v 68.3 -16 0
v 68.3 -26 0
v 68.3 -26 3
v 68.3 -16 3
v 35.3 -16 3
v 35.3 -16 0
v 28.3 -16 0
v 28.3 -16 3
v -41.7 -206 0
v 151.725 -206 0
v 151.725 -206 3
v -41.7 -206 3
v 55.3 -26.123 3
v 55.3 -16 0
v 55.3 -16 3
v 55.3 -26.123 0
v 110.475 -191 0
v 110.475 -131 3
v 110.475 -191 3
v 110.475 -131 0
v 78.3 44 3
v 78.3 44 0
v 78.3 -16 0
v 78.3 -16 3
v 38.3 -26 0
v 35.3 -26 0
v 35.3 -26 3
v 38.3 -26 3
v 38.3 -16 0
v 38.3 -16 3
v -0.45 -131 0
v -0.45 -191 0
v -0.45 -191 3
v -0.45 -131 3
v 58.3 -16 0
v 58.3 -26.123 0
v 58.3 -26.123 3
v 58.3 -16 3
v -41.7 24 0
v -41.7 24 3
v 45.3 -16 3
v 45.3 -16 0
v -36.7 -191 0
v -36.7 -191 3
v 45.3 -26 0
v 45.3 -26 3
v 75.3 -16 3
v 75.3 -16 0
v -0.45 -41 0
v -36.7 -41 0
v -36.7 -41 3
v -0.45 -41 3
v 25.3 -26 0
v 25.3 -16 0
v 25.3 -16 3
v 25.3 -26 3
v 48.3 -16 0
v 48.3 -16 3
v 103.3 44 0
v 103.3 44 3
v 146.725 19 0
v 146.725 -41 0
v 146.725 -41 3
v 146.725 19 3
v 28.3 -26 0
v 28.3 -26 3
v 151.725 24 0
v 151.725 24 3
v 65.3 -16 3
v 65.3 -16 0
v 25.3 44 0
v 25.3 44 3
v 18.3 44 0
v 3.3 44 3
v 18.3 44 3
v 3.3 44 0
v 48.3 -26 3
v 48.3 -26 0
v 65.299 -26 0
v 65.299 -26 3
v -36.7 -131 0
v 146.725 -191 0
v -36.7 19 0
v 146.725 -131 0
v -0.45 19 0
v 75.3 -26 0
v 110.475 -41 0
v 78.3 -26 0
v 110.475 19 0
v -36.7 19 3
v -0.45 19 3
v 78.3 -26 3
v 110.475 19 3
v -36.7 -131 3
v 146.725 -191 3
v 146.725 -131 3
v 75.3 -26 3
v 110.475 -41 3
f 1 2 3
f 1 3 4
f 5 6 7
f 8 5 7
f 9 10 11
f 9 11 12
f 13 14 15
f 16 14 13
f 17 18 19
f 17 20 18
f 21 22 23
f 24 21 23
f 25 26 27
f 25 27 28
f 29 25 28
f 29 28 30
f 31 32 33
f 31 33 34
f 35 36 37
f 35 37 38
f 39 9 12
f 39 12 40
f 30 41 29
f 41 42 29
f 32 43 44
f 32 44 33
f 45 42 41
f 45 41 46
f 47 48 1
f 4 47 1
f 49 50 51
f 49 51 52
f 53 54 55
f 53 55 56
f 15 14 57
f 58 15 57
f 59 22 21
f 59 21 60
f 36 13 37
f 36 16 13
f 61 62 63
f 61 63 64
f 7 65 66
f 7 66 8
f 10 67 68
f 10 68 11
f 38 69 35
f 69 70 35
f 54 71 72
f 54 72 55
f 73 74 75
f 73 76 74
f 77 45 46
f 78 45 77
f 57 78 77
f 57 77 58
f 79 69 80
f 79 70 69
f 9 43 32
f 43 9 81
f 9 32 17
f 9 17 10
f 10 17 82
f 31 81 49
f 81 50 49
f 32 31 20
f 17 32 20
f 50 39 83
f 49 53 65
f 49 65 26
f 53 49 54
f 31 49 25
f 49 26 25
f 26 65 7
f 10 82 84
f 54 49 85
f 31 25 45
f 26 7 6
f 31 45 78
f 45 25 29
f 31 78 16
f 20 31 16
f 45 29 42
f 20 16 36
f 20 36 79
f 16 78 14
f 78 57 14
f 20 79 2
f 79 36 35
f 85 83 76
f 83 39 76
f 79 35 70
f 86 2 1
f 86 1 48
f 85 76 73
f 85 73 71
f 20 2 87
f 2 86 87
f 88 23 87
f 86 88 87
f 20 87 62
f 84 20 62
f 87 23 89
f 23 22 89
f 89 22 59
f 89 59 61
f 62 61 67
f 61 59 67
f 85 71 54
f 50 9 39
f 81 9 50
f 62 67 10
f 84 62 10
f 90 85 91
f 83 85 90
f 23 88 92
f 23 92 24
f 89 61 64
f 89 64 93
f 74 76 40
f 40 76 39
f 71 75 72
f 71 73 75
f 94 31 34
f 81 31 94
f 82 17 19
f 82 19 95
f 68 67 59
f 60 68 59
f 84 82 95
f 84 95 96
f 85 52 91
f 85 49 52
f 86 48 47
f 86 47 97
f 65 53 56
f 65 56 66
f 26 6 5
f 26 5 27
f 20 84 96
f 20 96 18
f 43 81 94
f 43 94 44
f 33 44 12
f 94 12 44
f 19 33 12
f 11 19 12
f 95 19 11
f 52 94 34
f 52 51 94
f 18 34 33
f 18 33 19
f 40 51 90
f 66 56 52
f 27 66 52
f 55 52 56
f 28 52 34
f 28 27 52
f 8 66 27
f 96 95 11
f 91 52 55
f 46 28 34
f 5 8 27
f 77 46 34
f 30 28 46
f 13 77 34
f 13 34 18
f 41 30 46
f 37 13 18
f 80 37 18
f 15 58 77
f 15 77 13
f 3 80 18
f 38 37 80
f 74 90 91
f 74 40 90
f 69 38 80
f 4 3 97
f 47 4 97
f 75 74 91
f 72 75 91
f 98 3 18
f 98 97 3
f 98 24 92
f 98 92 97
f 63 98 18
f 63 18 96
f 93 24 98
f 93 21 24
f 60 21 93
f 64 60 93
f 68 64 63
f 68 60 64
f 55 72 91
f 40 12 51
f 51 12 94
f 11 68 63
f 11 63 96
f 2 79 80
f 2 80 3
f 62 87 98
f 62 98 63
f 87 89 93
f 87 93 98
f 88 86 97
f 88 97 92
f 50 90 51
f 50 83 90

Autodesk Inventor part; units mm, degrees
ref_plane "YZ Plane" through (0, 0, 0) normal (1, 0, 0) x (0, 1, 0)
ref_plane "XZ Plane" through (0, 0, 0) normal (0, 1, 0) x (-1, 0, 0)
ref_plane "XY Plane" through (0, 0, 0) normal (0, 0, 1) x (1, 0, 0)
sketch "Sketch1" plane through (0, 0, 0) normal (0, 0, 1) x (1, 0, 0)
  line L0 (151.725, 24) -> (151.725, -206)
  line L1 (151.725, -206) -> (-41.7, -206)
  line L2 (-41.7, -206) -> (-41.7, 24)
  line L3 (151.725, 24) -> (103.3, 44)
  line L4 (3.3, 44) -> (-41.7, 24)
  line L5 (78.3, 44) -> (78.3, -16)
  line L6 (3.3, 44) -> (18.3, 44)
  line L7 (78.3, 44) -> (103.3, 44)
  line L8 (-34.2, -33.5) -> (-34.2, 11.5) projected
  line L9 (-2.95, 11.5) -> (-2.95, -33.5) projected
  line L10 (-36.7, -41) -> (-0.45, -41)
  line L11 (-0.45, -41) -> (-0.45, 19)
  line L12 (-0.45, 19) -> (-36.7, 19)
  line L13 (-36.7, 19) -> (-36.7, -41)
  line L14 (110.475, -41) -> (146.725, -41)
  line L15 (146.725, -41) -> (146.725, 19)
  line L16 (146.725, 19) -> (110.475, 19)
  line L17 (110.475, 19) -> (110.475, -41)
  line L18 (110.475, -191) -> (146.725, -191)
  line L19 (146.725, -191) -> (146.725, -131)
  line L20 (146.725, -131) -> (110.475, -131)
  line L21 (110.475, -131) -> (110.475, -191)
  line L22 (-36.7, -191) -> (-0.45, -191)
  line L23 (-0.45, -191) -> (-0.45, -131)
  line L24 (-0.45, -131) -> (-36.7, -131)
  line L25 (-36.7, -131) -> (-36.7, -191)
  line L26 (144.225, -33.5) -> (144.225, 11.5) projected
  line L27 (112.975, 11.5) -> (112.975, -33.5) projected
  line L28 (112.975, -183.5) -> (112.975, -138.5) projected
  line L29 (144.225, -138.5) -> (144.225, -183.5) projected
  line L30 (-34.2, -138.5) -> (-34.2, -183.5) projected
  line L31 (-2.95, -183.5) -> (-2.95, -138.5) projected
  line L32 (75.3, -16) -> (75.2995, -26)
  line L33 (75.2995, -26) -> (78.2995, -26)
  line L34 (78.2995, -26) -> (78.3, -16)
  line L35 (65.3, -16) -> (65.2995, -26)
  line L36 (65.2995, -26) -> (68.2995, -26)
  line L37 (68.2995, -26) -> (68.3, -16)
  line L38 (55.3, -16) -> (55.2995, -26.1226)
  line L39 (55.2995, -26.1226) -> (58.2995, -26.1227)
  line L40 (58.2995, -26.1227) -> (58.3, -16)
  line L41 (78.3, -16) -> (78.3, -16)
  line L42 (75.3, -16) -> (68.3, -16)
  line L43 (65.3, -16) -> (58.3, -16)
  line L44 (45.3, -16) -> (45.2995, -25.9999)
  line L45 (48.2995, -26) -> (48.3, -16)
  line L46 (45.2995, -25.9999) -> (48.2995, -26)
  line L47 (55.3, -16) -> (48.3, -16)
  line L48 (38.2995, -26) -> (38.3, -16)
  line L49 (35.2995, -26) -> (38.2995, -26)
  line L50 (35.3, -16) -> (35.2995, -26)
  line L51 (28.2995, -26) -> (28.3, -16)
  line L52 (25.2995, -26) -> (28.2995, -26)
  line L53 (25.3, -16) -> (25.2995, -26)
  line L54 (45.3, -16) -> (38.3, -16)
  line L55 (35.3, -16) -> (28.3, -16)
  line L56 (18.3, 44) -> (25.3, 44)
  line L57 (25.3, 44) -> (25.3, -16)
  point P0 (-34.2, -11)
  point P1 (-36.7, -11)
  point P2 (128.6, -41)
  point P3 (110.475, -11)
  point P4 (112.975, -11)
  point P5 (128.6, -191)
  point P6 (128.6, -131)
  point P7 (110.475, -161)
  point P8 (112.975, -161)
  point P9 (-36.7, -161)
  point P10 (-34.2, -161)
  point P11 (75.2998, -21)
  point P12 (78.2998, -21)
  point P13 (76.775, -16.5)
  point P14 (76.7995, -26)
  point P15 (65.2998, -21)
  point P16 (68.2998, -21)
  point P17 (66.775, -16.5)
  point P18 (66.7995, -26)
  point P19 (55.2998, -21.0613)
  point P20 (58.2998, -21.0613)
  point P21 (56.775, -16.5)
  point P22 (56.7995, -26.1226)
  point P23 (45.2998, -20.9999)
  point P24 (46.7995, -25.9999)
  point P25 (43.0984, -16.3775)
  point P26 (48.2998, -21)
  point P27 (38.2998, -21)
  point P28 (36.7995, -26)
  point P29 (35.2998, -21)
  point P30 (28.2998, -21)
  point P31 (26.7995, -26)
  point P32 (25.2998, -21)
  point P33 (21.8, -16)
  point P34 (78.3, -16)
  point P35 (51.8, -16)
  point P36 (71.8, -16)
  dimension "d19" = 20
  dimension "d21" = 20
  dimension "d23" = 100
  dimension "d26" = 60
  dimension "d29" = 250
  dimension "d32" = 2.5
  dimension "d33" = 2.5
  dimension "d34" = 60
  dimension "d35" = 0
  dimension "d36" = 5
  dimension "d37" = 25
  dimension "d39" = 2.5
  dimension "d40" = 2.5
  dimension "d41" = 5
  dimension "d43" = 60
  dimension "d44" = 0
  dimension "d45" = 60
  dimension "d46" = 2.5
  dimension "d47" = 0
  dimension "d48" = 2.5
  dimension "d49" = 2.5
  dimension "d50" = 2.5
  dimension "d51" = 60
  dimension "d52" = 0
  dimension "d55" = 250
  dimension "d75" = 3
  dimension "d76" = 10
  dimension "d77" = 7
  dimension "d79" = 3
  dimension "d80" = 10
  dimension "d81" = 3
  dimension "d82" = 10
  dimension "d84" = 7
  dimension "d86" = 7
  dimension "d87" = 7
  dimension "d88" = 3
  dimension "d89" = 3
  dimension "d90" = 3
  dimension "d92" = 7
  dimension "d93" = 45
  dimension "d95" = 90
  dimension "d98" = 10
  dimension "d100" = 10
  dimension "d101" = 10
  dimension "d102" = 10
  dimension "d103" = 60
  dimension "d104" = 60
  dimension "d105" = 60
  dimension "d106" = 60
  dimension "d108" = 0
  dimension "d112" = 22
  dimension "d113" = 53
extrude "Extrusion2" add sketch "Sketch1" along normal blind 3
properties part number "car platform"
